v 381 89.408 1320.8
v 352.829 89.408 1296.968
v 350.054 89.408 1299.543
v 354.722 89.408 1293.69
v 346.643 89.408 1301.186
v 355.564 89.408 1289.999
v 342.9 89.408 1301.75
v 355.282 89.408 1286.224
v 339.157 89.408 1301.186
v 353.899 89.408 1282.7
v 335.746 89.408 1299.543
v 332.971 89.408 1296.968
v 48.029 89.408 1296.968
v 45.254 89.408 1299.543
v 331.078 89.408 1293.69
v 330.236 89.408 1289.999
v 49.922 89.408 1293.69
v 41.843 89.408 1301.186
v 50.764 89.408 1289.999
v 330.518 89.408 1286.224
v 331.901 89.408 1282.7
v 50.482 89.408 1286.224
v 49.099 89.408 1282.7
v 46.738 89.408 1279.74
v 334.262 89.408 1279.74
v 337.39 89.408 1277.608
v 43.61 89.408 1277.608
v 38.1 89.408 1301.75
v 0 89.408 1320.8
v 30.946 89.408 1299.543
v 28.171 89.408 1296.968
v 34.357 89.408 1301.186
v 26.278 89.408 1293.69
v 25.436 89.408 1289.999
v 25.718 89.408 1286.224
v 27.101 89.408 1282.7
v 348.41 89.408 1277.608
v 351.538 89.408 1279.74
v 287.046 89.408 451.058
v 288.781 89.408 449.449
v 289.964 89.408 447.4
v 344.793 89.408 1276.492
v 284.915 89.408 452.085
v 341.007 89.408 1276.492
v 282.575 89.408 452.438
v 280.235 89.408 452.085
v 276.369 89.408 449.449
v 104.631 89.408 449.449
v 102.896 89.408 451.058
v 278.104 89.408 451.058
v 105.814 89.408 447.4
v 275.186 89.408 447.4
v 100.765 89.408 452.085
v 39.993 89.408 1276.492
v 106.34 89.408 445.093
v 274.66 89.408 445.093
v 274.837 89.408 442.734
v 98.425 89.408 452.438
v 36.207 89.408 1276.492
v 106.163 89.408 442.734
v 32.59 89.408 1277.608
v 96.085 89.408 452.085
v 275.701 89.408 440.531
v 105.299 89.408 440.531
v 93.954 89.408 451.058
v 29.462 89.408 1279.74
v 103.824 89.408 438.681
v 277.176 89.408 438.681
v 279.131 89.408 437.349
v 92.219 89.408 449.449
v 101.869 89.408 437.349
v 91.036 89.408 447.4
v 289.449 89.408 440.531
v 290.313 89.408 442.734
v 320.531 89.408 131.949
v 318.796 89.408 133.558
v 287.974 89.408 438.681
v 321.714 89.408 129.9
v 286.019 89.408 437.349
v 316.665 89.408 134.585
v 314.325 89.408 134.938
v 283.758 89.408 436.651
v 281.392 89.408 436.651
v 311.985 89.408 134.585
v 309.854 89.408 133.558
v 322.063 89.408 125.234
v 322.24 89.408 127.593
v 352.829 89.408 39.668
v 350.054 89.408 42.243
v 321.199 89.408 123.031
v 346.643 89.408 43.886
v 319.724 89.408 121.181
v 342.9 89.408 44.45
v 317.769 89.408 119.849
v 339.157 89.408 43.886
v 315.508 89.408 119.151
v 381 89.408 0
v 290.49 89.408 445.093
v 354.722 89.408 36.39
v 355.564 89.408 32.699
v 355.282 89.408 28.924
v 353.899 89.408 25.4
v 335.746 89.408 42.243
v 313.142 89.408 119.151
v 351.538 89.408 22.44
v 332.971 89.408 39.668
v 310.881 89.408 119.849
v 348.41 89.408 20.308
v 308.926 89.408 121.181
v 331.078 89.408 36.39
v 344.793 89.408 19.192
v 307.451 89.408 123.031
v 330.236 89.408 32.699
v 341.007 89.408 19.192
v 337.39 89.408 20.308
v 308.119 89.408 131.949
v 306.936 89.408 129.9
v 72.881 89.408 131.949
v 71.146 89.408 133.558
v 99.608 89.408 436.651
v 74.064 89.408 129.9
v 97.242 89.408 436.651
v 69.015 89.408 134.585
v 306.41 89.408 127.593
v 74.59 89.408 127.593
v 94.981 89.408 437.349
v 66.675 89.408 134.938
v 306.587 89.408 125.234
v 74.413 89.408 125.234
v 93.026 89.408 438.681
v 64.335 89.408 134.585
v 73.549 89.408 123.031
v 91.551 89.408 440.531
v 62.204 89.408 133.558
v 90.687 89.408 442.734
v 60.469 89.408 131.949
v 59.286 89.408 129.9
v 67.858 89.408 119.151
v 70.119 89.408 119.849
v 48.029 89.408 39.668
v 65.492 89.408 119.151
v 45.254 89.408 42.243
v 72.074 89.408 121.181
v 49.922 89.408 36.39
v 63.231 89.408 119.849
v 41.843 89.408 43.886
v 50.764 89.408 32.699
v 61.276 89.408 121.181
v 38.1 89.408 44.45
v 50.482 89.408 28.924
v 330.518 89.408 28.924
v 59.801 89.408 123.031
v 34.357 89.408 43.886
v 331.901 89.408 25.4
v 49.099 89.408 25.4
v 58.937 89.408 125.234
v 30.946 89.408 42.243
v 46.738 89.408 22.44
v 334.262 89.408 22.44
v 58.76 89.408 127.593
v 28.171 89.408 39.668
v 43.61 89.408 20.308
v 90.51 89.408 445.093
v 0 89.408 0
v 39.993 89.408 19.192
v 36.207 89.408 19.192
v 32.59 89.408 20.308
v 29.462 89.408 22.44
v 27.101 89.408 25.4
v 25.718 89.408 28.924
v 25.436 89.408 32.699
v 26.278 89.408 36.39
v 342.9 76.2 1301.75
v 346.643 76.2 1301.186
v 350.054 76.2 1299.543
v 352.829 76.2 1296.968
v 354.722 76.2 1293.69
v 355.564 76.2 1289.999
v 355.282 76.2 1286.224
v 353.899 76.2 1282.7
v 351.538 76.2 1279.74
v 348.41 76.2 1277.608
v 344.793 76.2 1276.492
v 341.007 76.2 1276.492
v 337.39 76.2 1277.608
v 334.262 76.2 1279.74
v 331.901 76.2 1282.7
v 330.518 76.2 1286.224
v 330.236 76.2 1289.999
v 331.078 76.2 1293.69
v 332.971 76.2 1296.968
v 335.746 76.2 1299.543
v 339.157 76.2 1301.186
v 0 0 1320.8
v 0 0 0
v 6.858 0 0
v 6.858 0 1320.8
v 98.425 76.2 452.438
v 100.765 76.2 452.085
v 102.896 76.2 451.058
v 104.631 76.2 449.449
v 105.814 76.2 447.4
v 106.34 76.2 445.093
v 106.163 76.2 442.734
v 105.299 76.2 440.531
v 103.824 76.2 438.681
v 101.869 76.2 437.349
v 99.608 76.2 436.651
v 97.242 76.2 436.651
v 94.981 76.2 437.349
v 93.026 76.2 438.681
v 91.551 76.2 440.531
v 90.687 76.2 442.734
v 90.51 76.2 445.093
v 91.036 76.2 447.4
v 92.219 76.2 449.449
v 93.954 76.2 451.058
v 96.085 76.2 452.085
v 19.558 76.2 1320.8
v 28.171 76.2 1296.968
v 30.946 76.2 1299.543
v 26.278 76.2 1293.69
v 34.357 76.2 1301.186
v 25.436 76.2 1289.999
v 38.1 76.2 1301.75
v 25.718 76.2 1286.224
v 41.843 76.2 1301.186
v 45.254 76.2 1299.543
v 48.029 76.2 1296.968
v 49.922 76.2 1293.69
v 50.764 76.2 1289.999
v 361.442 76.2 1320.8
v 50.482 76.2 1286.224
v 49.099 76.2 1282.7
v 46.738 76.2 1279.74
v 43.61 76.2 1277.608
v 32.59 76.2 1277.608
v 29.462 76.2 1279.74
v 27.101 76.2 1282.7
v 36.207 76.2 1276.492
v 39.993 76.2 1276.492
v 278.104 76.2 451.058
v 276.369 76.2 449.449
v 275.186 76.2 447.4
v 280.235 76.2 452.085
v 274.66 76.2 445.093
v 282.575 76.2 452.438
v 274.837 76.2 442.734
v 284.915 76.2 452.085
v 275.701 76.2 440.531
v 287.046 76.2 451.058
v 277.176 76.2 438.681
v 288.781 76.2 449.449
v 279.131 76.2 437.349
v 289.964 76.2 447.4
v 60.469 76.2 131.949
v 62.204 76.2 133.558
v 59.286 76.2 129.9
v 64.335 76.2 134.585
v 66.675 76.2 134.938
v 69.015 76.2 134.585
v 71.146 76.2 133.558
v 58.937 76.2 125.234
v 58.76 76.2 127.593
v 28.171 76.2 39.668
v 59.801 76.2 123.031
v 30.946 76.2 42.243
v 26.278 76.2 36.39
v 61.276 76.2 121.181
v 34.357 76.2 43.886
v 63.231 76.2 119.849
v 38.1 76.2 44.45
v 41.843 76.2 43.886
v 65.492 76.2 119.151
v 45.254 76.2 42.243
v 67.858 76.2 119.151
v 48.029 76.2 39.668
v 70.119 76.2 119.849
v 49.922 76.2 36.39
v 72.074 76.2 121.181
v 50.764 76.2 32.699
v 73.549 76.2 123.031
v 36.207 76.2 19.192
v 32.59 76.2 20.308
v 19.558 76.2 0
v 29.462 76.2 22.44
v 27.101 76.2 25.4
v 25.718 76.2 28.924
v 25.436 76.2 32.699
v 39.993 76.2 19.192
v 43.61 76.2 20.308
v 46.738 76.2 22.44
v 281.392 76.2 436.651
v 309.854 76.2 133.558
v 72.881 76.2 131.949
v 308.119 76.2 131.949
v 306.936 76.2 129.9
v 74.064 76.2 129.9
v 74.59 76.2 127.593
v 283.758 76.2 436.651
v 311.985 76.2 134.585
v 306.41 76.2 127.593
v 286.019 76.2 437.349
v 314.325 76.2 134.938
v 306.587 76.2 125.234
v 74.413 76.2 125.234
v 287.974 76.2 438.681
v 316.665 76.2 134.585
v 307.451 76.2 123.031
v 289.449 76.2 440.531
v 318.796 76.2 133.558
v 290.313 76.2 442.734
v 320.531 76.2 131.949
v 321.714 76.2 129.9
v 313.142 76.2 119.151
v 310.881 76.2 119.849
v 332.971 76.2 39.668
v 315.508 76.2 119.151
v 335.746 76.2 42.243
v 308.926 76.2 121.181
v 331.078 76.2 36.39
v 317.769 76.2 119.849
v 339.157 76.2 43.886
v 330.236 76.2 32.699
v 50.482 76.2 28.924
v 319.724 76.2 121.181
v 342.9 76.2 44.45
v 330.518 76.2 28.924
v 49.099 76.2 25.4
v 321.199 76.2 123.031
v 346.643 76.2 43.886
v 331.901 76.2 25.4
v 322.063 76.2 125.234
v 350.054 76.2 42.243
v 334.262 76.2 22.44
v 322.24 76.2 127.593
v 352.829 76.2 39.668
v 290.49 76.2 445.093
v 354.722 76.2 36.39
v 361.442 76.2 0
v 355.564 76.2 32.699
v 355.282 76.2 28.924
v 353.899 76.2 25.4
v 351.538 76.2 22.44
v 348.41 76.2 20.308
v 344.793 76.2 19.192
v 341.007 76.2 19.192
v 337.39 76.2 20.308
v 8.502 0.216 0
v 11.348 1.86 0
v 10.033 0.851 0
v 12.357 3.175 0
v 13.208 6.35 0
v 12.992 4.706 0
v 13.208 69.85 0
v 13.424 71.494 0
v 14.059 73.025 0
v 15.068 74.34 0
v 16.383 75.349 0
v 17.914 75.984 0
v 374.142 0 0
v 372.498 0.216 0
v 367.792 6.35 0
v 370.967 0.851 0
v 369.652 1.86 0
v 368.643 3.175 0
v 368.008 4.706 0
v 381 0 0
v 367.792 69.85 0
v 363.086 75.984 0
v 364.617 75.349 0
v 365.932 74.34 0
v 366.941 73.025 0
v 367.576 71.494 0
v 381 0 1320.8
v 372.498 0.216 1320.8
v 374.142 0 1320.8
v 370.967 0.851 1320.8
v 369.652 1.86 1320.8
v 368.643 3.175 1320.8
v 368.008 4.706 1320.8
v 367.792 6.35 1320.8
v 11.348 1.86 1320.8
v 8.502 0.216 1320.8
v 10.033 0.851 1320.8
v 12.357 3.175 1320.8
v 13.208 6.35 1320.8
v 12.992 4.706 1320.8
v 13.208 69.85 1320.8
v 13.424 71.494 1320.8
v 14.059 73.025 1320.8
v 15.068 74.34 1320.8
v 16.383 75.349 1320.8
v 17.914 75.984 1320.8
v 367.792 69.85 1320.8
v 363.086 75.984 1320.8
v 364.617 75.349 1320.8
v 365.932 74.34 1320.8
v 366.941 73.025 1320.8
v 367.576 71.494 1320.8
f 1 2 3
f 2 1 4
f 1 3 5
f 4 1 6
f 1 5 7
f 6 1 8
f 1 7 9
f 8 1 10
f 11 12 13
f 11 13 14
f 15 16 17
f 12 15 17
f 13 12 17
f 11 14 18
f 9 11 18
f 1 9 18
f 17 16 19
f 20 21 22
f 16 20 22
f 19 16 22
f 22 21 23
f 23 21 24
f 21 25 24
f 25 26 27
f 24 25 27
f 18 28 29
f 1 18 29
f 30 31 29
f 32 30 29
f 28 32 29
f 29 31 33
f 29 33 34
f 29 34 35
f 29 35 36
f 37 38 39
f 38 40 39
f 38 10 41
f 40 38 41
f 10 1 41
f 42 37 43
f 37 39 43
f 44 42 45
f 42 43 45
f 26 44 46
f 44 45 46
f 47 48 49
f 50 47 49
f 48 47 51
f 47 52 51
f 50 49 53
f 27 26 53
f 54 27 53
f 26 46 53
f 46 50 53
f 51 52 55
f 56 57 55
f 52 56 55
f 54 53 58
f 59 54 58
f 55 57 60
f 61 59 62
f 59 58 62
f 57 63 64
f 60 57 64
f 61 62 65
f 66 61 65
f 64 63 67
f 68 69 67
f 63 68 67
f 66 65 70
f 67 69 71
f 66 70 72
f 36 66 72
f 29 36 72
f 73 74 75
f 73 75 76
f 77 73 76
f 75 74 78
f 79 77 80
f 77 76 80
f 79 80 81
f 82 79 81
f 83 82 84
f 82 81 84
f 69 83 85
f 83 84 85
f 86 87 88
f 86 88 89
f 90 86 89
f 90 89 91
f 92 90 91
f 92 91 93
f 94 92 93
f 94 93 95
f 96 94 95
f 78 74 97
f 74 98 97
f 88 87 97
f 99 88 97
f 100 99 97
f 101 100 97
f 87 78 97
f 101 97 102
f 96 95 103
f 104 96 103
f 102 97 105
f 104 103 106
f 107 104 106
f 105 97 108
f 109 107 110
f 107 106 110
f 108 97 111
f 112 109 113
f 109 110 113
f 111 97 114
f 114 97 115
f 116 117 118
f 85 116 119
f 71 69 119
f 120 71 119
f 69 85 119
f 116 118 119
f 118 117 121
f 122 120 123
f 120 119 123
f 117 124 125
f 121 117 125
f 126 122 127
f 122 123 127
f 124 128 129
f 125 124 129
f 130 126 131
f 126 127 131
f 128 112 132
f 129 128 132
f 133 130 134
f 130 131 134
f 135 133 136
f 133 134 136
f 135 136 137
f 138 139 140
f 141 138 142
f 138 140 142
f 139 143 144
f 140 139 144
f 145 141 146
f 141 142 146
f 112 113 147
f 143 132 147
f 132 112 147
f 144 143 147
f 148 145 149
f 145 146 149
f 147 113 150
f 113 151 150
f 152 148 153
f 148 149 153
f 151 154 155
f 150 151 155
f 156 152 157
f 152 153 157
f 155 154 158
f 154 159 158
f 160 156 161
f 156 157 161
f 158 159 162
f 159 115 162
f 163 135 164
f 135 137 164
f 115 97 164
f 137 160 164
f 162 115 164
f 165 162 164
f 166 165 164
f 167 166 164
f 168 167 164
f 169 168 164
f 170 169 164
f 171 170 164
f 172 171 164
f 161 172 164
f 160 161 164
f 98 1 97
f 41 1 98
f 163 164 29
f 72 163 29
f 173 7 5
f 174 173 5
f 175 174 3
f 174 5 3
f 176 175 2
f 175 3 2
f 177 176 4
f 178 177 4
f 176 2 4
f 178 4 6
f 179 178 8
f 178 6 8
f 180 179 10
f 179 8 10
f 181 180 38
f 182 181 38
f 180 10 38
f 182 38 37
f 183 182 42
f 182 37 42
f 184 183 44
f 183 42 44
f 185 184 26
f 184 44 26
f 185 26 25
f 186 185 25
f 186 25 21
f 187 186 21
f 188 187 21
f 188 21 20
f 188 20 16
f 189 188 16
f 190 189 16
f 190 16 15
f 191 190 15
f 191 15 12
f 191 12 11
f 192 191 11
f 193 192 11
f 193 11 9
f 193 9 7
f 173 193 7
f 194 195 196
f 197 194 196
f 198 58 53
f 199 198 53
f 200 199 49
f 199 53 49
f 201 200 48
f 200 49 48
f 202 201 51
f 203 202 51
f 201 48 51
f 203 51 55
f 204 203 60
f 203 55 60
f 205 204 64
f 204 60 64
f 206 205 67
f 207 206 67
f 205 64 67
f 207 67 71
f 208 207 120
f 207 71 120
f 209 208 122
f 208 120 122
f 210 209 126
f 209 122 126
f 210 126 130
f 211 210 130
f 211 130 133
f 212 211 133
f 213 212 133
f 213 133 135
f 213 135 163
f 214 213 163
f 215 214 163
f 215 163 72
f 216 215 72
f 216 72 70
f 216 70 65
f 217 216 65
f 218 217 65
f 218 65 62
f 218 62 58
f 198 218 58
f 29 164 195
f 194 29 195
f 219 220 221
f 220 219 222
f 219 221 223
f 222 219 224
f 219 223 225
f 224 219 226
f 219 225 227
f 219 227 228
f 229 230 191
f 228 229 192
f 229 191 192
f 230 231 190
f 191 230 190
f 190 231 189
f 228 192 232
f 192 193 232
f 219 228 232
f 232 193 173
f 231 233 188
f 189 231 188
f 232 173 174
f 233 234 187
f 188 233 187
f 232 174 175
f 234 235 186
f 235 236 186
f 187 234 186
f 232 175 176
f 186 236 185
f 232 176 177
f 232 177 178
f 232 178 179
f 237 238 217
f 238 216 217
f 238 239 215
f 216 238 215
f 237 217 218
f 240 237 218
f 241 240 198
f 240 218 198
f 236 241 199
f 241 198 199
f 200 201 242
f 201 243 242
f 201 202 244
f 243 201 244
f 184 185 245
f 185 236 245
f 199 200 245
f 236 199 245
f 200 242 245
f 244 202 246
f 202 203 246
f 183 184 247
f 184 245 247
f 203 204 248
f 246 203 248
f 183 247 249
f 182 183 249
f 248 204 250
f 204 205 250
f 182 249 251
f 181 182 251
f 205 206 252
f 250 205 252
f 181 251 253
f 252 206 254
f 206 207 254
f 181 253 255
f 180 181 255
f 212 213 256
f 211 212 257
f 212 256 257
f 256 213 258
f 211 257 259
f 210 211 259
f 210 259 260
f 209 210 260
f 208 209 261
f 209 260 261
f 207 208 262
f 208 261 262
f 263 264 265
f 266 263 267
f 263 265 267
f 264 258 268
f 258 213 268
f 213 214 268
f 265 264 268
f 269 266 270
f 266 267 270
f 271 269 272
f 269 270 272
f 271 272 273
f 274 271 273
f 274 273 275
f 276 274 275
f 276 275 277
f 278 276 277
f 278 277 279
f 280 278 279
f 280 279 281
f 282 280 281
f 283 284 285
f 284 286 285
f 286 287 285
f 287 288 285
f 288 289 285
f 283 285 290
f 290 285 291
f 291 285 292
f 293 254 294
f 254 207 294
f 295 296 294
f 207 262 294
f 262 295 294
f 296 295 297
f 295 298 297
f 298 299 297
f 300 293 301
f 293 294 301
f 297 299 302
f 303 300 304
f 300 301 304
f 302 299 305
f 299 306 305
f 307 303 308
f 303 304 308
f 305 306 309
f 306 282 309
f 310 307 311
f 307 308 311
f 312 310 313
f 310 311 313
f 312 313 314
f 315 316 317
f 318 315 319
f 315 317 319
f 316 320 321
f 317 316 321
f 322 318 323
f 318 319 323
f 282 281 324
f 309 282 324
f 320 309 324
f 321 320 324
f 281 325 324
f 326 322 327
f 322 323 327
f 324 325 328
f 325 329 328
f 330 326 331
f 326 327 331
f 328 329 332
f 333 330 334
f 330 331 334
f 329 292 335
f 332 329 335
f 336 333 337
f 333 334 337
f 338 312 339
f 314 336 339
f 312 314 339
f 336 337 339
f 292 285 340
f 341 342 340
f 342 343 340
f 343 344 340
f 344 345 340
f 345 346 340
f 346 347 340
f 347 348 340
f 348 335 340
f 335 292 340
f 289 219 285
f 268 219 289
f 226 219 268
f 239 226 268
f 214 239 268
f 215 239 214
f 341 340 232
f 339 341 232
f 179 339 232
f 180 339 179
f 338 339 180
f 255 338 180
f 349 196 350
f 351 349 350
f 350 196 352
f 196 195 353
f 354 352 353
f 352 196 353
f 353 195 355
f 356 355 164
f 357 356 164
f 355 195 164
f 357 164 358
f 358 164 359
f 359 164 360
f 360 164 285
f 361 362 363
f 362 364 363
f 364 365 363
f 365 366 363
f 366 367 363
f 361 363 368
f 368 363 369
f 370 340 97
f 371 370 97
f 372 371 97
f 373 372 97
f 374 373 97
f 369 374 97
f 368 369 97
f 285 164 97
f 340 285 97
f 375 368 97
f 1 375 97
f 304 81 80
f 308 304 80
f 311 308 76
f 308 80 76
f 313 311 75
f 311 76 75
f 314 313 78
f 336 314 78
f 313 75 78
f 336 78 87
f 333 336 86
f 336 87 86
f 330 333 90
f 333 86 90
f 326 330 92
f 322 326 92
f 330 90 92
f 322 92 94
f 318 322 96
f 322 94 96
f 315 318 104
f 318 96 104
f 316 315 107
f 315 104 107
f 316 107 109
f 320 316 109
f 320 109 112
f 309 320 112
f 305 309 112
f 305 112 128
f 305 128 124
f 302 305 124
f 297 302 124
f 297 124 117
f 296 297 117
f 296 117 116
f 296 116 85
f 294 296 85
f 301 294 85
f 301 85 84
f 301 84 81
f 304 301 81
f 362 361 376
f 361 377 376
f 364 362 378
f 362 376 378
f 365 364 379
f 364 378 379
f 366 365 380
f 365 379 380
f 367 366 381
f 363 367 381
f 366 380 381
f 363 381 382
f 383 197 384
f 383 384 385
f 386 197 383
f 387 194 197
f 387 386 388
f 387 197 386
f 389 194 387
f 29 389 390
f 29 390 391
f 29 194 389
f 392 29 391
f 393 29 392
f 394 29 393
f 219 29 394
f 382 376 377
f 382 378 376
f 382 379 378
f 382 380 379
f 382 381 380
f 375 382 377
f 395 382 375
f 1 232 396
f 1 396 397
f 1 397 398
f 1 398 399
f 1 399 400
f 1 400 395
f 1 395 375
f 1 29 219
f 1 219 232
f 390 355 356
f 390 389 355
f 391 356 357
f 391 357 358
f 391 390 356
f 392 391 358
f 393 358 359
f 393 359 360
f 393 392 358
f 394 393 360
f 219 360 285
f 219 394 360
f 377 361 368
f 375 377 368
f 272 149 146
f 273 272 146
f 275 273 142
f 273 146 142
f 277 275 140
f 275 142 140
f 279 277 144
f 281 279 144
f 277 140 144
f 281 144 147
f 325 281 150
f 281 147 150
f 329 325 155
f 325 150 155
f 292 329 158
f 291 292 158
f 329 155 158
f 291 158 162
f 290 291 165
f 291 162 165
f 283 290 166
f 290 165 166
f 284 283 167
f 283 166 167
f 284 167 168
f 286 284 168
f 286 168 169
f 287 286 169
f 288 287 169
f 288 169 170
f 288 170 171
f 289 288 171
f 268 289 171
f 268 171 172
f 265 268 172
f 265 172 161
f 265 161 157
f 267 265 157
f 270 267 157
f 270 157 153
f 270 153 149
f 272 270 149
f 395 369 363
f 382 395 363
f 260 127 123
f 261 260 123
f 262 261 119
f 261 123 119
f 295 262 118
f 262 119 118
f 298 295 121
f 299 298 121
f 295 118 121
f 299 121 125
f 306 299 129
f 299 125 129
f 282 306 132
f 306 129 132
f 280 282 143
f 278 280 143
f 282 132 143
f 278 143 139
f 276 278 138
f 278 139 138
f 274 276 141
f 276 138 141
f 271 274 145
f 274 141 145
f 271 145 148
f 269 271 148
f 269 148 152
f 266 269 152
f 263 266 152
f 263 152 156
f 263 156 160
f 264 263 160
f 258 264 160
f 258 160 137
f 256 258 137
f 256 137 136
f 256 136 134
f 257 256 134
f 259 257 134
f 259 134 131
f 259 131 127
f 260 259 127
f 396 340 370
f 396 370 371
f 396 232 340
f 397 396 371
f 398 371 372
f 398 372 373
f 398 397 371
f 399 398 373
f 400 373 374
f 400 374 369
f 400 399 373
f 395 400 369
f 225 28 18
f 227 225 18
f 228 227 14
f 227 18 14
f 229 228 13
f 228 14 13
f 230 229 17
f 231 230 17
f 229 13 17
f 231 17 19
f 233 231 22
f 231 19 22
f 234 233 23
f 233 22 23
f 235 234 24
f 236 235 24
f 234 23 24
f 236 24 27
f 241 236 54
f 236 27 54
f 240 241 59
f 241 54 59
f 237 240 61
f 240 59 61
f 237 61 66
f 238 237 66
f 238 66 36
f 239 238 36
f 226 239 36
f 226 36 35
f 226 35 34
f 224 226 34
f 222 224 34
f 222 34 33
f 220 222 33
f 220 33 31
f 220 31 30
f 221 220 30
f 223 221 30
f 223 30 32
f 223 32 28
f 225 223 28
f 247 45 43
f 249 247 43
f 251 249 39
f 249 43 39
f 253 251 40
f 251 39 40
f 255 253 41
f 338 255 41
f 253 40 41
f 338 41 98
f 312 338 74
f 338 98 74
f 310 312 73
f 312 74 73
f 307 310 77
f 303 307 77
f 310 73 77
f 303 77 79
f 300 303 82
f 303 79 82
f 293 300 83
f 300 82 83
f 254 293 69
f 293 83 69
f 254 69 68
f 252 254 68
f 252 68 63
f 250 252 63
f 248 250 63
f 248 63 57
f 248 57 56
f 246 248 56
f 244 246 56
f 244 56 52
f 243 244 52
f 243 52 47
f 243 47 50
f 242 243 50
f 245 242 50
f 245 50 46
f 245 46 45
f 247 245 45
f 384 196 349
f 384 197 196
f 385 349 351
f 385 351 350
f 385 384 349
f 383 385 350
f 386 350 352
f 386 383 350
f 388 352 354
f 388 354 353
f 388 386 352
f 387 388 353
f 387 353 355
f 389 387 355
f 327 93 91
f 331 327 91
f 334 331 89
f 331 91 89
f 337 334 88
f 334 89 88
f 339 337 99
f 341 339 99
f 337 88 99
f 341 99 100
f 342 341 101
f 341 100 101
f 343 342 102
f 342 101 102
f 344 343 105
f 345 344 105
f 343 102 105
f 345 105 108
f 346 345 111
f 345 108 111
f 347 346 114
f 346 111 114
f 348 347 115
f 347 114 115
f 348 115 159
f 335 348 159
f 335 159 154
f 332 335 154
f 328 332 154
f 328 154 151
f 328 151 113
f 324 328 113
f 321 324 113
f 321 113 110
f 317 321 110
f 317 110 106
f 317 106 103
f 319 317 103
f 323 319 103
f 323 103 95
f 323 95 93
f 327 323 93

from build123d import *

# Parameters (mm, degrees)
BOSS_EXTRUDE1_DEPTH = 1320.8
FILLET1_R           = 6.35
CUT_EXTRUDE1_REACH  = 1379.559
SKETCH2_R           = 7.9375
CUT_EXTRUDE2_REACH  = 1379.559
SKETCH3_R           = 12.7


with BuildPart() as part:
    # Sketch1 → Boss-Extrude1 (new body)
    with BuildSketch(Plane.XY):
        Polygon((367.792, 0), (381, 0), (381, 89.408), (0, 89.408), (0, 0), (13.208, 0), (13.208, 76.2), (367.792, 76.2), align=None)
    extrude(amount=BOSS_EXTRUDE1_DEPTH)

    # Fillet1
    fillet1_edges = [part.edges().sort_by_distance(p)[0] for p in [
        (367.792, 0, 660.4),
        (367.792, 76.2, 660.4),
        (13.208, 76.2, 660.4),
        (13.208, 0, 660.4),
    ]]
    fillet(fillet1_edges, radius=FILLET1_R)

    # Sketch2 → Cut-Extrude1 (cut, up to next)
    with BuildSketch(Plane(origin=(0, 89.408, 0), x_dir=(1, 0, 0), z_dir=(0, 1, 0)), mode=Mode.PRIVATE) as cut_extrude1_sk1:
        with Locations(Location((66.675, -127, 0), (0, 0, 270))):
            Circle(SKETCH2_R)
    cut_extrude1_tool1 = extrude(cut_extrude1_sk1.sketch, amount=-CUT_EXTRUDE1_REACH, mode=Mode.PRIVATE) & part.part
    # Sketch2 → Cut-Extrude1 (cut, up to next)
    with BuildSketch(Plane(origin=(0, 89.408, 0), x_dir=(1, 0, 0), z_dir=(0, 1, 0)), mode=Mode.PRIVATE) as cut_extrude1_sk2:
        with Locations(Location((314.325, -127, 0), (0, 0, 270))):
            Circle(SKETCH2_R)
    cut_extrude1_tool2 = extrude(cut_extrude1_sk2.sketch, amount=-CUT_EXTRUDE1_REACH, mode=Mode.PRIVATE) & part.part
    # Sketch2 → Cut-Extrude1 (cut, up to next)
    with BuildSketch(Plane(origin=(0, 89.408, 0), x_dir=(1, 0, 0), z_dir=(0, 1, 0)), mode=Mode.PRIVATE) as cut_extrude1_sk3:
        with Locations(Location((98.425, -444.5, 0), (0, 0, 270))):
            Circle(SKETCH2_R)
    cut_extrude1_tool3 = extrude(cut_extrude1_sk3.sketch, amount=-CUT_EXTRUDE1_REACH, mode=Mode.PRIVATE) & part.part
    # Sketch2 → Cut-Extrude1 (cut, up to next)
    with BuildSketch(Plane(origin=(0, 89.408, 0), x_dir=(1, 0, 0), z_dir=(0, 1, 0)), mode=Mode.PRIVATE) as cut_extrude1_sk4:
        with Locations(Location((282.575, -444.5, 0), (0, 0, 270))):
            Circle(SKETCH2_R)
    cut_extrude1_tool4 = extrude(cut_extrude1_sk4.sketch, amount=-CUT_EXTRUDE1_REACH, mode=Mode.PRIVATE) & part.part
    add(cut_extrude1_tool1.solids().sort_by_distance((66.675, 89.408, 127))[0], mode=Mode.SUBTRACT)
    add(cut_extrude1_tool2.solids().sort_by_distance((314.325, 89.408, 127))[0], mode=Mode.SUBTRACT)
    add(cut_extrude1_tool3.solids().sort_by_distance((98.425, 89.408, 444.5))[0], mode=Mode.SUBTRACT)
    add(cut_extrude1_tool4.solids().sort_by_distance((282.575, 89.408, 444.5))[0], mode=Mode.SUBTRACT)

    # Sketch3 → Cut-Extrude2 (cut, up to next)
    with BuildSketch(Plane(origin=(0, 89.408, 0), x_dir=(1, 0, 0), z_dir=(0, 1, 0)), mode=Mode.PRIVATE) as cut_extrude2_sk1:
        with Locations(Location((38.1, -31.75, 0), (0, 0, 270))):
            Circle(SKETCH3_R)
    cut_extrude2_tool1 = extrude(cut_extrude2_sk1.sketch, amount=-CUT_EXTRUDE2_REACH, mode=Mode.PRIVATE) & part.part
    # Sketch3 → Cut-Extrude2 (cut, up to next)
    with BuildSketch(Plane(origin=(0, 89.408, 0), x_dir=(1, 0, 0), z_dir=(0, 1, 0)), mode=Mode.PRIVATE) as cut_extrude2_sk2:
        with Locations(Location((342.9, -31.75, 0), (0, 0, 270))):
            Circle(SKETCH3_R)
    cut_extrude2_tool2 = extrude(cut_extrude2_sk2.sketch, amount=-CUT_EXTRUDE2_REACH, mode=Mode.PRIVATE) & part.part
    # Sketch3 → Cut-Extrude2 (cut, up to next)
    with BuildSketch(Plane(origin=(0, 89.408, 0), x_dir=(1, 0, 0), z_dir=(0, 1, 0)), mode=Mode.PRIVATE) as cut_extrude2_sk3:
        with Locations(Location((38.1, -1289.05, 0), (0, 0, 270))):
            Circle(SKETCH3_R)
    cut_extrude2_tool3 = extrude(cut_extrude2_sk3.sketch, amount=-CUT_EXTRUDE2_REACH, mode=Mode.PRIVATE) & part.part
    # Sketch3 → Cut-Extrude2 (cut, up to next)
    with BuildSketch(Plane(origin=(0, 89.408, 0), x_dir=(1, 0, 0), z_dir=(0, 1, 0)), mode=Mode.PRIVATE) as cut_extrude2_sk4:
        with Locations(Location((342.9, -1289.05, 0), (0, 0, 270))):
            Circle(SKETCH3_R)
    cut_extrude2_tool4 = extrude(cut_extrude2_sk4.sketch, amount=-CUT_EXTRUDE2_REACH, mode=Mode.PRIVATE) & part.part
    add(cut_extrude2_tool1.solids().sort_by_distance((38.1, 89.408, 31.75))[0], mode=Mode.SUBTRACT)
    add(cut_extrude2_tool2.solids().sort_by_distance((342.9, 89.408, 31.75))[0], mode=Mode.SUBTRACT)
    add(cut_extrude2_tool3.solids().sort_by_distance((38.1, 89.408, 1289.05))[0], mode=Mode.SUBTRACT)
    add(cut_extrude2_tool4.solids().sort_by_distance((342.9, 89.408, 1289.05))[0], mode=Mode.SUBTRACT)


solid = part.part
